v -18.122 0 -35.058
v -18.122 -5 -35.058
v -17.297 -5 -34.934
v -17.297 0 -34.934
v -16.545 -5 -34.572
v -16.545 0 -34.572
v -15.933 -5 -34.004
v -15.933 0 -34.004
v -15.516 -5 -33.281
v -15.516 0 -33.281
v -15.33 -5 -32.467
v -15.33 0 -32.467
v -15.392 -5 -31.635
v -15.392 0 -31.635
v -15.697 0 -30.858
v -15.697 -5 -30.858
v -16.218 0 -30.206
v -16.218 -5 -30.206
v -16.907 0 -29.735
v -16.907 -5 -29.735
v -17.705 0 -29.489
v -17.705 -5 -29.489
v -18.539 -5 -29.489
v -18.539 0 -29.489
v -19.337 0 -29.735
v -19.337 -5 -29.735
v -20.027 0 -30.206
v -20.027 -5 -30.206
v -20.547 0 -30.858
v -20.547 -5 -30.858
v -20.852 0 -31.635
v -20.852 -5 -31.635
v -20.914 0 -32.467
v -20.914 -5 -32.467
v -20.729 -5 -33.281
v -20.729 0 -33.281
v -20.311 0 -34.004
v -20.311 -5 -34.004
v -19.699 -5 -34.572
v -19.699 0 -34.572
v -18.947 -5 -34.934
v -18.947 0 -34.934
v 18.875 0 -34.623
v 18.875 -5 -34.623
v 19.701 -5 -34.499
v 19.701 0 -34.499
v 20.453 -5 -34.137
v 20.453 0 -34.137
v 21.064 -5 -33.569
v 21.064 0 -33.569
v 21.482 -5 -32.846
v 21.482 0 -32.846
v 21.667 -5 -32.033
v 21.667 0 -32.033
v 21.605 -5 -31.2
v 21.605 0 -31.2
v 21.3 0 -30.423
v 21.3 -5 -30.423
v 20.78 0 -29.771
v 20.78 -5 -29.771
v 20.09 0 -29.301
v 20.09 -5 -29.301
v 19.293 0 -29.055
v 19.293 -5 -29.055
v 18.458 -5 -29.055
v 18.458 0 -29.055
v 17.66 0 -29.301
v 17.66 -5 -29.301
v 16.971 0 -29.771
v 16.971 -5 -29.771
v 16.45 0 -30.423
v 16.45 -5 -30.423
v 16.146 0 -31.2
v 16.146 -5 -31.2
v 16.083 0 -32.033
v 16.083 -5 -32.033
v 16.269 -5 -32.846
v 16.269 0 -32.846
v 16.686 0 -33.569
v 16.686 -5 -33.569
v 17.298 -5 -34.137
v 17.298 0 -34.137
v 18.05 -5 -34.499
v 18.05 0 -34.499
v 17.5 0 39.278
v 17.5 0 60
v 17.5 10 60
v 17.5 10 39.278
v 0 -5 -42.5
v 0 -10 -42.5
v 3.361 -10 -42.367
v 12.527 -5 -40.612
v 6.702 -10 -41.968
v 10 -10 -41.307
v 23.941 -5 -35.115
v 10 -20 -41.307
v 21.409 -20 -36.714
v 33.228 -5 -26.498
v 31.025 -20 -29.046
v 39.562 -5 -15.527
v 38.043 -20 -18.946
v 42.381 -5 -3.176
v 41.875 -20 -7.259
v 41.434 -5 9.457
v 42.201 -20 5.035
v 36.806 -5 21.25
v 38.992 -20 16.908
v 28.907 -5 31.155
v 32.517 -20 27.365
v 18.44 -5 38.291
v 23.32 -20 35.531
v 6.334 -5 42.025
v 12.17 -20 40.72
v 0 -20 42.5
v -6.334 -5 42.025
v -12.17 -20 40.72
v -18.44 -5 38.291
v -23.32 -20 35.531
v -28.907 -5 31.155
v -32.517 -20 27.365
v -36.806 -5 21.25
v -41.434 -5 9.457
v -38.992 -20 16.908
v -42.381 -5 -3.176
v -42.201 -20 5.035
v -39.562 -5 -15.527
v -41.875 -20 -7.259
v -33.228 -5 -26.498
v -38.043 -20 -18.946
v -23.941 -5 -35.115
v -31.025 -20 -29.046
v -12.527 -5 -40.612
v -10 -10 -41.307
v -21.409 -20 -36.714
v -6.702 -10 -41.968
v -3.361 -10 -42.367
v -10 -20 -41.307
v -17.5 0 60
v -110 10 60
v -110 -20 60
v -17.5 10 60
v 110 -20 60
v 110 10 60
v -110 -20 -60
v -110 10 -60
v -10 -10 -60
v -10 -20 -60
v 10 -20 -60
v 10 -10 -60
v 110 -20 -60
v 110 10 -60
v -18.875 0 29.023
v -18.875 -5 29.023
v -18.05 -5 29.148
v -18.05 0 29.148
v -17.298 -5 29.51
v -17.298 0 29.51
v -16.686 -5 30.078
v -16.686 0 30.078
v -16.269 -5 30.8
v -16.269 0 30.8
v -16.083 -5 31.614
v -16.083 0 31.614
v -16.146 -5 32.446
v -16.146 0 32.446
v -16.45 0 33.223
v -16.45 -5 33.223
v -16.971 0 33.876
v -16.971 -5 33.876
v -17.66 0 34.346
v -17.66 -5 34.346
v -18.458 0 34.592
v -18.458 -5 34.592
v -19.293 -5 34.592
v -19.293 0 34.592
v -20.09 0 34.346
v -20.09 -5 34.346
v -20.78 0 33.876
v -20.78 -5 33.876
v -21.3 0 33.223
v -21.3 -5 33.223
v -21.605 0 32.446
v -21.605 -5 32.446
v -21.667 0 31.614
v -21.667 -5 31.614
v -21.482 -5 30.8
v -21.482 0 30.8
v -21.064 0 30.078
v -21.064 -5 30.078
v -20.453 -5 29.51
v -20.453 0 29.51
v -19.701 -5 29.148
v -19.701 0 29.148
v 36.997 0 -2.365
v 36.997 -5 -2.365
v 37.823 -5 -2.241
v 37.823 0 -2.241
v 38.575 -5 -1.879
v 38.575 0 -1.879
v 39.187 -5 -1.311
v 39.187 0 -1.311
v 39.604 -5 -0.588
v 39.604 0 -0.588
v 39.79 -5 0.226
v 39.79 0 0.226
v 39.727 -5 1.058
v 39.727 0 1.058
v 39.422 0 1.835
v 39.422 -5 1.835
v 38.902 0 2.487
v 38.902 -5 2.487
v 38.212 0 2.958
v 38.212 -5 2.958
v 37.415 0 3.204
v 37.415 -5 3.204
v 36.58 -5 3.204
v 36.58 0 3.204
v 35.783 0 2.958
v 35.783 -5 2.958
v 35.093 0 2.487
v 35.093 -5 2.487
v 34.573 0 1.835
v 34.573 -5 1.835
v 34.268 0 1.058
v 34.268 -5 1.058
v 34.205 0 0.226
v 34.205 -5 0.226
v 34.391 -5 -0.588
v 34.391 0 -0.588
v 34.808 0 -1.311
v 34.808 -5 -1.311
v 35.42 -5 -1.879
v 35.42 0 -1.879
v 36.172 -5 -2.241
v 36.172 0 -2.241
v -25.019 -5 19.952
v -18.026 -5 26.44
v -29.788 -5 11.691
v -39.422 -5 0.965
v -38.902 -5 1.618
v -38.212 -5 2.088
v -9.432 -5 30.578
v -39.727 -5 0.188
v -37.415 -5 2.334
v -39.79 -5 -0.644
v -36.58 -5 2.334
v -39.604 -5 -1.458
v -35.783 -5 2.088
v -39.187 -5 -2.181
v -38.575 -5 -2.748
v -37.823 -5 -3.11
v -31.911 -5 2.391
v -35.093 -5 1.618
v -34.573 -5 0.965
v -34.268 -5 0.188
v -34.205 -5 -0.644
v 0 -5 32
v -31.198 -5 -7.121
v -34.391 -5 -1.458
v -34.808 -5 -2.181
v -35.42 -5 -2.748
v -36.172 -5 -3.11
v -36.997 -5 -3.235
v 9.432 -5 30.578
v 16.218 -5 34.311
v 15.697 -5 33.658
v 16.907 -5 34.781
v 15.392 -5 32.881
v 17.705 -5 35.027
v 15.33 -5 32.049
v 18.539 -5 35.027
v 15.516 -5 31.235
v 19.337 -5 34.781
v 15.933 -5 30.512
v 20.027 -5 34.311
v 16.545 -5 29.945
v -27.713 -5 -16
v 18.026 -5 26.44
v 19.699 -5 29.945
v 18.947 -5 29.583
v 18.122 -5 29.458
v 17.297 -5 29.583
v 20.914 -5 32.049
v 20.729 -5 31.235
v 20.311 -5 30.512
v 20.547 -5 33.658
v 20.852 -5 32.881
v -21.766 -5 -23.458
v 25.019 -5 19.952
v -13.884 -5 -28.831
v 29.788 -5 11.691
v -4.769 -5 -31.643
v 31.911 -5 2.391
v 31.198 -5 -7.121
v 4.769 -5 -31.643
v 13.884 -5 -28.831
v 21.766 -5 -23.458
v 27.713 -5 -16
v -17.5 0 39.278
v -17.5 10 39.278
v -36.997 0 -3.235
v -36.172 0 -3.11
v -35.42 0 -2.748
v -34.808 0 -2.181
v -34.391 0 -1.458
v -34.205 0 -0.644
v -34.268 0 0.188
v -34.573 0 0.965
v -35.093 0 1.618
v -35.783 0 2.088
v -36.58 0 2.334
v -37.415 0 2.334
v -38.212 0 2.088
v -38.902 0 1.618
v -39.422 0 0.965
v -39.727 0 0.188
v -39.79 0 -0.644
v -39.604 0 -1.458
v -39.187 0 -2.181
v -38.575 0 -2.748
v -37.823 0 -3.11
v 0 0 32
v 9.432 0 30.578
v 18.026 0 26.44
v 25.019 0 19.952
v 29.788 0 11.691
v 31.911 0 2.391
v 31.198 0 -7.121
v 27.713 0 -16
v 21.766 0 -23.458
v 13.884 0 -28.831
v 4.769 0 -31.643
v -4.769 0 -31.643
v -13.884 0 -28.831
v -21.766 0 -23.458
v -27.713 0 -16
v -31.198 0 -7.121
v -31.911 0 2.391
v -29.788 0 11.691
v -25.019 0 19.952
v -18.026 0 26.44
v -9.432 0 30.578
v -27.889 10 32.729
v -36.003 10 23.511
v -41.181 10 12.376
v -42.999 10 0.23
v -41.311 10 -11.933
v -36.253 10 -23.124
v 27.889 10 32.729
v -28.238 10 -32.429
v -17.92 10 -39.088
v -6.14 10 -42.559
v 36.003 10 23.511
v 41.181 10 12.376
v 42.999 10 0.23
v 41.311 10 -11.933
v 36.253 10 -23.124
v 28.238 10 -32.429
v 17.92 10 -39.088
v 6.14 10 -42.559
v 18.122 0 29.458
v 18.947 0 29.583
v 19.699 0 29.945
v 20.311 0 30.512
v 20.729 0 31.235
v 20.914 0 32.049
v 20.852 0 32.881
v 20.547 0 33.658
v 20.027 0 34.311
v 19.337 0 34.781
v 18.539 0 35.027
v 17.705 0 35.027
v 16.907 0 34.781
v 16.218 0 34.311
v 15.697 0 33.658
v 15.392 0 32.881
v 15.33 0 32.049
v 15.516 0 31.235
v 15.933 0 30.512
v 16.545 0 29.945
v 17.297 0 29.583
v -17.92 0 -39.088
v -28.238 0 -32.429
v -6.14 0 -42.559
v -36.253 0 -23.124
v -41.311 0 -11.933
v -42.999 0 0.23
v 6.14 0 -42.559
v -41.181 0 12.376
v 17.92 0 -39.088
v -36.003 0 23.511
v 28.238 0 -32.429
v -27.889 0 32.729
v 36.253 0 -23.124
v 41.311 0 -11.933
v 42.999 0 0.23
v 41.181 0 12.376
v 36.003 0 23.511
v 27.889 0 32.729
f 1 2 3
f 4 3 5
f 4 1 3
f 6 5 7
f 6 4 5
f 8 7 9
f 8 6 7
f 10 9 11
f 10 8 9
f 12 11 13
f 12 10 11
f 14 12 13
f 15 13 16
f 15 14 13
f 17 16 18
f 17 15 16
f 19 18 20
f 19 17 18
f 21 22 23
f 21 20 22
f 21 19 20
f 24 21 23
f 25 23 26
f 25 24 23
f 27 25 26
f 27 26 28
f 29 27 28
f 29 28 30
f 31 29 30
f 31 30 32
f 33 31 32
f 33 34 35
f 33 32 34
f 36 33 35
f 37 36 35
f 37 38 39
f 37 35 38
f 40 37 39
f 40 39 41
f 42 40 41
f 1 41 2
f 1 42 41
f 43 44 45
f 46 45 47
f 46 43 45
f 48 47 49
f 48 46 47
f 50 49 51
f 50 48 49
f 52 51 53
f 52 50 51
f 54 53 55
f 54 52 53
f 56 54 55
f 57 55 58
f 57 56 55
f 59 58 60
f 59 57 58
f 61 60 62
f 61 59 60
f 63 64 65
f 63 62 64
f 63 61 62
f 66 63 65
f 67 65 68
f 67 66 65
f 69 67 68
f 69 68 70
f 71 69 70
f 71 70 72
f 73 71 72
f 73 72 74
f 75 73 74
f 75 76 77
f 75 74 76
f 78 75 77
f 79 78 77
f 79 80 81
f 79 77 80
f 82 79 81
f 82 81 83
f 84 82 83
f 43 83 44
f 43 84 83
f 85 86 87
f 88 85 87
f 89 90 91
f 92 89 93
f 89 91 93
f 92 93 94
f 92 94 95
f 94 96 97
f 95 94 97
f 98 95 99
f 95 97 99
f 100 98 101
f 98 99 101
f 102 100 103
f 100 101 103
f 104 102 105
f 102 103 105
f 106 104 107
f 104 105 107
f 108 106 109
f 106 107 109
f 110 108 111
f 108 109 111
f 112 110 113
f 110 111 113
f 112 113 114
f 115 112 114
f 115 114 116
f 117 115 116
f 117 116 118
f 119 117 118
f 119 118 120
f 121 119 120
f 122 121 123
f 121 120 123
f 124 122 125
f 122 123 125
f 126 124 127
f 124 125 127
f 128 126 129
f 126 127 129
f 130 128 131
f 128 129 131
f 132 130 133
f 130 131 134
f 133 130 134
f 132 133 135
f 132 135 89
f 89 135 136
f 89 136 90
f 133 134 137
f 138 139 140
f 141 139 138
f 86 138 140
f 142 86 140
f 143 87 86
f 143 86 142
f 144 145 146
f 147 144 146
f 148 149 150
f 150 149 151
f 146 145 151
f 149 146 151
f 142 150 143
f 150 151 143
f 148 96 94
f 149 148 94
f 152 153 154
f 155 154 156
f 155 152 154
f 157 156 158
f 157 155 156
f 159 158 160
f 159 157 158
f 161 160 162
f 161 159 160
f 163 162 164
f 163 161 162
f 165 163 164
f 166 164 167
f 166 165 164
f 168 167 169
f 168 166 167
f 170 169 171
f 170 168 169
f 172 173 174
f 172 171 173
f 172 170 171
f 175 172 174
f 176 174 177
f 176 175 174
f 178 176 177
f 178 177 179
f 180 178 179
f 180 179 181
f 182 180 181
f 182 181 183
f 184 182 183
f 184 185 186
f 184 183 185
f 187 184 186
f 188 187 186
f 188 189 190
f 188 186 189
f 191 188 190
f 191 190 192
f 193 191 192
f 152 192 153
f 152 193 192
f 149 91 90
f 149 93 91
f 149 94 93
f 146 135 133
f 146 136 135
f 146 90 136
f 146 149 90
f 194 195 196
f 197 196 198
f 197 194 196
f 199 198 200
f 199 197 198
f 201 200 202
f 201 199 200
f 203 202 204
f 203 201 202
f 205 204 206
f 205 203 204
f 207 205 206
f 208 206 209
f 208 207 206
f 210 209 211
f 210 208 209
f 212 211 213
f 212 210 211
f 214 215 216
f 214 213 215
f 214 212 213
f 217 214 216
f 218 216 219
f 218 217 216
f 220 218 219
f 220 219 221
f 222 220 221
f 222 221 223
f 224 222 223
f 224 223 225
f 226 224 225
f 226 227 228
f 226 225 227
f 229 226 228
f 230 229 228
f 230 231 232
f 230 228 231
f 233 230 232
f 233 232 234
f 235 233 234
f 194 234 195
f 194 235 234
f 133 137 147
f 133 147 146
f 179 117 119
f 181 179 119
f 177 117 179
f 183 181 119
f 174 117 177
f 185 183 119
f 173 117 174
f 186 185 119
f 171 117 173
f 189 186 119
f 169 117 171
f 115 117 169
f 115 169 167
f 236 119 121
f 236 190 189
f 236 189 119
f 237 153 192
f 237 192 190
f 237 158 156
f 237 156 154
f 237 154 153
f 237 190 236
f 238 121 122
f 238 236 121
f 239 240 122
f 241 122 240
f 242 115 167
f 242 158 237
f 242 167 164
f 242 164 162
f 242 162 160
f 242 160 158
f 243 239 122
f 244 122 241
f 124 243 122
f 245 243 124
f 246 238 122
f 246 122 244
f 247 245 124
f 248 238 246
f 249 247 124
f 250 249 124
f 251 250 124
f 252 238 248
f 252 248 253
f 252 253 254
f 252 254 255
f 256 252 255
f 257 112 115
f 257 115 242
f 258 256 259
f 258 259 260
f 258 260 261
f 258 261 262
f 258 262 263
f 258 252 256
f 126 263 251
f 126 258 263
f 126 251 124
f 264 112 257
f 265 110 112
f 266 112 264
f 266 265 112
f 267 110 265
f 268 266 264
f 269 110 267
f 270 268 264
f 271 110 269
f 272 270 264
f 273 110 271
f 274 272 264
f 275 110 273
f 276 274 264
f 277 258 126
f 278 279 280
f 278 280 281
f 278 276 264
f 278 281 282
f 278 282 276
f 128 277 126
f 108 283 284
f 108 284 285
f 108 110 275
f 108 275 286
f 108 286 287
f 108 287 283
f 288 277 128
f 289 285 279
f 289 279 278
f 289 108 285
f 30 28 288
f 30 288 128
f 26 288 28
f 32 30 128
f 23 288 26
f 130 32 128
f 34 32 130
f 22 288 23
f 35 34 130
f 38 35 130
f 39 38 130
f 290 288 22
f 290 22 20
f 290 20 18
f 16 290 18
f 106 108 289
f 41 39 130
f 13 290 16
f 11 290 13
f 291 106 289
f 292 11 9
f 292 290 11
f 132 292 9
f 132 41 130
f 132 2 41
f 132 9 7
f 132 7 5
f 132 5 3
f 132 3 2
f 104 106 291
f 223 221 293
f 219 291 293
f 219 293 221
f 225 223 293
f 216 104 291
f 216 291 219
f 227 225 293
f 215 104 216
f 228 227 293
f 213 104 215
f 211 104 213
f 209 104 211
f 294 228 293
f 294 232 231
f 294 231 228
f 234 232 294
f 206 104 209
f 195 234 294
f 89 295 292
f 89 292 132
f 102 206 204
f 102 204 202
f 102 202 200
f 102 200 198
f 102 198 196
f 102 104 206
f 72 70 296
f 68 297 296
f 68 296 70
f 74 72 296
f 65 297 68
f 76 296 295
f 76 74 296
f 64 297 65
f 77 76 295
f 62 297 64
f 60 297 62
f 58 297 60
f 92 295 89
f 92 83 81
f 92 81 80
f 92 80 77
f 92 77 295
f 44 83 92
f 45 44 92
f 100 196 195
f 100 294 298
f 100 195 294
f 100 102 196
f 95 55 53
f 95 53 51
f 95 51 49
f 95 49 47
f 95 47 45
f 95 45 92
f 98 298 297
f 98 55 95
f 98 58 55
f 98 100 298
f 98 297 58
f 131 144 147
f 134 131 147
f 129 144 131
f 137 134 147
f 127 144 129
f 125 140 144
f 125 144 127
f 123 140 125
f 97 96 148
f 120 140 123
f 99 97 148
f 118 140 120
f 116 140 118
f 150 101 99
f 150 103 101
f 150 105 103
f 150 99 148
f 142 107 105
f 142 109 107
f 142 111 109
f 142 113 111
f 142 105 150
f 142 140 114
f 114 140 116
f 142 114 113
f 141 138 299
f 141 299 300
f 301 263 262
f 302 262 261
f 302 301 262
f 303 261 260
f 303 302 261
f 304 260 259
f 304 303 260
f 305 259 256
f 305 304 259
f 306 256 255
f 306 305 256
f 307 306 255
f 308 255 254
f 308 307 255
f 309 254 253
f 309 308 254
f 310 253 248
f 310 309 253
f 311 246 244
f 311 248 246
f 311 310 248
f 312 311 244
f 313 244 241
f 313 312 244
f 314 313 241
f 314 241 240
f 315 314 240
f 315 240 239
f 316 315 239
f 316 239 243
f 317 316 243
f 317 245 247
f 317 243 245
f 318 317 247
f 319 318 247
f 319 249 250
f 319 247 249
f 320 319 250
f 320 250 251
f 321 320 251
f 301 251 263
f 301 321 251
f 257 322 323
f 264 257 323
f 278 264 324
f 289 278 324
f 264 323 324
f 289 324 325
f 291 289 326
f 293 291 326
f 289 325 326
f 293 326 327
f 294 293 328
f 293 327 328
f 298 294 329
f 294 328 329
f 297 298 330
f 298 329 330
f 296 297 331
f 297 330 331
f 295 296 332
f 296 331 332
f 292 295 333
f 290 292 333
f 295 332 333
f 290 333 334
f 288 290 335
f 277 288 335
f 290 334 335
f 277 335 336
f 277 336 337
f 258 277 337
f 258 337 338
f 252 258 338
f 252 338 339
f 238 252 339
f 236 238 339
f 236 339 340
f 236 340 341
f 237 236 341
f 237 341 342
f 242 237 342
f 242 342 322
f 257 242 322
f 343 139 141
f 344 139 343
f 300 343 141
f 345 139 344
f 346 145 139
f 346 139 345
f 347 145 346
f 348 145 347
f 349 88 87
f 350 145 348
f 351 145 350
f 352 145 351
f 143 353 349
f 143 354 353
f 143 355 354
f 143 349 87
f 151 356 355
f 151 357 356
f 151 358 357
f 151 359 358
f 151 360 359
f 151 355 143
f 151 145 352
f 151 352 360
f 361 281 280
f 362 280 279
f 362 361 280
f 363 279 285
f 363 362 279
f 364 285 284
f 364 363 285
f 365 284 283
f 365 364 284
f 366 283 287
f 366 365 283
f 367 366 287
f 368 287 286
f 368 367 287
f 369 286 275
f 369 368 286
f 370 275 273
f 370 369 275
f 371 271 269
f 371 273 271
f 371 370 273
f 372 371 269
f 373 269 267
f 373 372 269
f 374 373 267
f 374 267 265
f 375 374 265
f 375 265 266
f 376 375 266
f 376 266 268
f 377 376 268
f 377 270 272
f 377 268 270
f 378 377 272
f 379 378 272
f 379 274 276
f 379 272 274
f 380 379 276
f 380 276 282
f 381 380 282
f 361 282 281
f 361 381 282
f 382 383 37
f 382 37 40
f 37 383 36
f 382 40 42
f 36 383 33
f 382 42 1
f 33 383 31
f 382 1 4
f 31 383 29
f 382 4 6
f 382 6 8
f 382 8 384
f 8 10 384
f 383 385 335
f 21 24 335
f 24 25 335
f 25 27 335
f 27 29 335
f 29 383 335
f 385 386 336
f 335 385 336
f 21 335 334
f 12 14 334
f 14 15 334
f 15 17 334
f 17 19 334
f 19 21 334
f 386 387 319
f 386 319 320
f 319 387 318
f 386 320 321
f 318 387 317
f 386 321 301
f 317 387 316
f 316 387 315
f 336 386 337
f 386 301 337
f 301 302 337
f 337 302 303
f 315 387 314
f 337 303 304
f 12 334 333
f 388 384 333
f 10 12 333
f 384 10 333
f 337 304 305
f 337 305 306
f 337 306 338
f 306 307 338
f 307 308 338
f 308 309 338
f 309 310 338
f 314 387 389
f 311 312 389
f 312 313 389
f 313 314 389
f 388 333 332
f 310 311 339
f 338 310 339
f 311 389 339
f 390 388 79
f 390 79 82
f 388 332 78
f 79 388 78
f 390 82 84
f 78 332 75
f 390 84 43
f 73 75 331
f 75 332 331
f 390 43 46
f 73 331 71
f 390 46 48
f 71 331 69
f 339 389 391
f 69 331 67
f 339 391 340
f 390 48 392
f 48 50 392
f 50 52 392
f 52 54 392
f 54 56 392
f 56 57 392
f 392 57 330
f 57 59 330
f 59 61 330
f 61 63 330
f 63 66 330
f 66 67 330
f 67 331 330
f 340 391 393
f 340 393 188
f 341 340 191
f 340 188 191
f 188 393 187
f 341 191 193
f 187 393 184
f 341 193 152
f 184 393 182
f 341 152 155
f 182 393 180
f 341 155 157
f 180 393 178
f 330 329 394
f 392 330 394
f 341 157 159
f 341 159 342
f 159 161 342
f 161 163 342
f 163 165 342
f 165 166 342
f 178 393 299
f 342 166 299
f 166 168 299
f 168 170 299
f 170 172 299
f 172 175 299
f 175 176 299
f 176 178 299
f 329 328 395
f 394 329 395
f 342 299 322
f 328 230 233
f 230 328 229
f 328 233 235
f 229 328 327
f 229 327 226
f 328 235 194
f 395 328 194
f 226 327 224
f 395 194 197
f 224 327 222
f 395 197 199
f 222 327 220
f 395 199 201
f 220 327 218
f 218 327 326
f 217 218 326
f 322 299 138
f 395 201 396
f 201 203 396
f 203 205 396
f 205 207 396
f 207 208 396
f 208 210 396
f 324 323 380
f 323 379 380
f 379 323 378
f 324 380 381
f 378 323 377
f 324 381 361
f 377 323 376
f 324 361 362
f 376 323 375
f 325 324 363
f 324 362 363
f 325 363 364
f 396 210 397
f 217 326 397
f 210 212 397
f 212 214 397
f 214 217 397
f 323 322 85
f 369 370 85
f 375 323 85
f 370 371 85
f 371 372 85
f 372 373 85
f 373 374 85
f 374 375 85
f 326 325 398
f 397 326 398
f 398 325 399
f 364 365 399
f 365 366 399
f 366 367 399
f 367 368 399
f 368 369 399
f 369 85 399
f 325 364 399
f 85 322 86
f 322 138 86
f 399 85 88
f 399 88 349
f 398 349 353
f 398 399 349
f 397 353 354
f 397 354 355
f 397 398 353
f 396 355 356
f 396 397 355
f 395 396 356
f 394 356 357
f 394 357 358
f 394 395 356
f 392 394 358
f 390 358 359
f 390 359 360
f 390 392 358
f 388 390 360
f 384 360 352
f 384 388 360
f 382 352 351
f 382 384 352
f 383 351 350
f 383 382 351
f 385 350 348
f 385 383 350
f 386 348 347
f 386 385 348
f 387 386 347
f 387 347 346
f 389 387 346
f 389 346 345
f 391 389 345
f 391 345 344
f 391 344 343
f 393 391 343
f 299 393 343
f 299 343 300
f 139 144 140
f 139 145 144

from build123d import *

# Parameters (mm, degrees)
SKETCH1_W               = 220
SKETCH1_H               = 120
SKETCH1_R               = 43
BOSS_EXTRUDE1_DEPTH     = 10
SKETCH2_W               = 220
SKETCH2_H               = 120
SKETCH2_R               = 2.8
BOSS_EXTRUDE2_DEPTH     = 20
CUT_EXTRUDE1_REACH      = 166.012
CUT_EXTRUDE1_END_RADIUS = 43
SKETCH3_W               = 35
SKETCH3_H               = 10
SKETCH4_R               = 32
CUT_EXTRUDE2_DEPTH      = 127.885775404
CUT_EXTRUDE3_REACH      = 166.012
CUT_EXTRUDE3_END_RADIUS = 32
SKETCH5_W               = 20
SKETCH5_H               = 10
SKETCH6_R               = 42.5
CUT_EXTRUDE4_DEPTH      = 15


with BuildPart() as part:
    # Sketch1 → Boss-Extrude1 (new body)
    with BuildSketch(Plane(origin=(0, 0, 0), x_dir=(1, 0, 0), z_dir=(0, 1, 0))):
        Rectangle(SKETCH1_W, SKETCH1_H)
        with Locations(Location((0, 0, 0), (0, 0, 270))):
            Circle(SKETCH1_R, mode=Mode.SUBTRACT)
    extrude(amount=BOSS_EXTRUDE1_DEPTH)

    # Sketch2 → Boss-Extrude2 (add)
    with BuildSketch(Plane.XZ):
        Rectangle(SKETCH2_W, SKETCH2_H)
        with Locations(Location((18.122136771, 32.25814872, 0), (0, 0, 270))):
            Circle(SKETCH2_R, mode=Mode.SUBTRACT)
        with Locations(Location((36.997444656, 0.434843546, 0), (0, 0, 270))):
            Circle(SKETCH2_R, mode=Mode.SUBTRACT)
        with Locations(Location((18.875307886, -31.823305174, 0), (0, 0, 270))):
            Circle(SKETCH2_R, mode=Mode.SUBTRACT)
        with Locations(Location((-18.122136771, -32.25814872, 0), (0, 0, 270))):
            Circle(SKETCH2_R, mode=Mode.SUBTRACT)
        with Locations(Location((-36.997444656, -0.434843546, 0), (0, 0, 270))):
            Circle(SKETCH2_R, mode=Mode.SUBTRACT)
        with Locations(Location((-18.875307886, 31.823305174, 0), (0, 0, 270))):
            Circle(SKETCH2_R, mode=Mode.SUBTRACT)
    extrude(amount=BOSS_EXTRUDE2_DEPTH)

    # Cut-Extrude1: up to this cylinder (the profile starts outside it)
    cut_extrude1_end = Plane(origin=(0, 5, 0), z_dir=(0, -1, 0)) * Cylinder(CUT_EXTRUDE1_END_RADIUS, 419.024, mode=Mode.PRIVATE)
    # Sketch3 → Cut-Extrude1 (cut, up to the surface)
    with BuildSketch(Plane.XY.offset(60), mode=Mode.PRIVATE) as cut_extrude1_sk1:
        with Locations((0, 5)):
            Rectangle(SKETCH3_W, SKETCH3_H)
    cut_extrude1_tool1 = extrude(cut_extrude1_sk1.sketch, amount=-CUT_EXTRUDE1_REACH, mode=Mode.PRIVATE) - cut_extrude1_end
    add(cut_extrude1_tool1.solids().sort_by_distance((0, 5, 60))[0], mode=Mode.SUBTRACT)

    # Sketch4 → Cut-Extrude2 (cut, through all)
    with BuildSketch(Plane(origin=(0, 0, 0), x_dir=(1, 0, 0), z_dir=(0, 1, 0))):
        with Locations(Location((0, 0, 0), (0, 0, 270))):
            Circle(SKETCH4_R)
    extrude(amount=-CUT_EXTRUDE2_DEPTH, mode=Mode.SUBTRACT)

    # Cut-Extrude3: up to this cylinder (the profile starts outside it)
    cut_extrude3_end = Plane(origin=(0, -15, 0), z_dir=(0, 1, 0)) * Cylinder(CUT_EXTRUDE3_END_RADIUS, 397.024, mode=Mode.PRIVATE)
    # Sketch5 → Cut-Extrude3 (cut, up to the surface)
    with BuildSketch(Plane(origin=(0, 0, -60), x_dir=(-1, 0, 0), z_dir=(0, 0, -1)), mode=Mode.PRIVATE) as cut_extrude3_sk1:
        with Locations((0, -15)):
            Rectangle(SKETCH5_W, SKETCH5_H)
    cut_extrude3_tool1 = extrude(cut_extrude3_sk1.sketch, amount=-CUT_EXTRUDE3_REACH, mode=Mode.PRIVATE) - cut_extrude3_end
    add(cut_extrude3_tool1.solids().sort_by_distance((0, -15, -60))[0], mode=Mode.SUBTRACT)

    # Sketch6 → Cut-Extrude4 (cut)
    with BuildSketch(Plane.XZ.offset(20)):
        with Locations(Location((0, 0, 0), (0, 0, 270))):
            Circle(SKETCH6_R)
    extrude(amount=-CUT_EXTRUDE4_DEPTH, mode=Mode.SUBTRACT)


solid = part.part
